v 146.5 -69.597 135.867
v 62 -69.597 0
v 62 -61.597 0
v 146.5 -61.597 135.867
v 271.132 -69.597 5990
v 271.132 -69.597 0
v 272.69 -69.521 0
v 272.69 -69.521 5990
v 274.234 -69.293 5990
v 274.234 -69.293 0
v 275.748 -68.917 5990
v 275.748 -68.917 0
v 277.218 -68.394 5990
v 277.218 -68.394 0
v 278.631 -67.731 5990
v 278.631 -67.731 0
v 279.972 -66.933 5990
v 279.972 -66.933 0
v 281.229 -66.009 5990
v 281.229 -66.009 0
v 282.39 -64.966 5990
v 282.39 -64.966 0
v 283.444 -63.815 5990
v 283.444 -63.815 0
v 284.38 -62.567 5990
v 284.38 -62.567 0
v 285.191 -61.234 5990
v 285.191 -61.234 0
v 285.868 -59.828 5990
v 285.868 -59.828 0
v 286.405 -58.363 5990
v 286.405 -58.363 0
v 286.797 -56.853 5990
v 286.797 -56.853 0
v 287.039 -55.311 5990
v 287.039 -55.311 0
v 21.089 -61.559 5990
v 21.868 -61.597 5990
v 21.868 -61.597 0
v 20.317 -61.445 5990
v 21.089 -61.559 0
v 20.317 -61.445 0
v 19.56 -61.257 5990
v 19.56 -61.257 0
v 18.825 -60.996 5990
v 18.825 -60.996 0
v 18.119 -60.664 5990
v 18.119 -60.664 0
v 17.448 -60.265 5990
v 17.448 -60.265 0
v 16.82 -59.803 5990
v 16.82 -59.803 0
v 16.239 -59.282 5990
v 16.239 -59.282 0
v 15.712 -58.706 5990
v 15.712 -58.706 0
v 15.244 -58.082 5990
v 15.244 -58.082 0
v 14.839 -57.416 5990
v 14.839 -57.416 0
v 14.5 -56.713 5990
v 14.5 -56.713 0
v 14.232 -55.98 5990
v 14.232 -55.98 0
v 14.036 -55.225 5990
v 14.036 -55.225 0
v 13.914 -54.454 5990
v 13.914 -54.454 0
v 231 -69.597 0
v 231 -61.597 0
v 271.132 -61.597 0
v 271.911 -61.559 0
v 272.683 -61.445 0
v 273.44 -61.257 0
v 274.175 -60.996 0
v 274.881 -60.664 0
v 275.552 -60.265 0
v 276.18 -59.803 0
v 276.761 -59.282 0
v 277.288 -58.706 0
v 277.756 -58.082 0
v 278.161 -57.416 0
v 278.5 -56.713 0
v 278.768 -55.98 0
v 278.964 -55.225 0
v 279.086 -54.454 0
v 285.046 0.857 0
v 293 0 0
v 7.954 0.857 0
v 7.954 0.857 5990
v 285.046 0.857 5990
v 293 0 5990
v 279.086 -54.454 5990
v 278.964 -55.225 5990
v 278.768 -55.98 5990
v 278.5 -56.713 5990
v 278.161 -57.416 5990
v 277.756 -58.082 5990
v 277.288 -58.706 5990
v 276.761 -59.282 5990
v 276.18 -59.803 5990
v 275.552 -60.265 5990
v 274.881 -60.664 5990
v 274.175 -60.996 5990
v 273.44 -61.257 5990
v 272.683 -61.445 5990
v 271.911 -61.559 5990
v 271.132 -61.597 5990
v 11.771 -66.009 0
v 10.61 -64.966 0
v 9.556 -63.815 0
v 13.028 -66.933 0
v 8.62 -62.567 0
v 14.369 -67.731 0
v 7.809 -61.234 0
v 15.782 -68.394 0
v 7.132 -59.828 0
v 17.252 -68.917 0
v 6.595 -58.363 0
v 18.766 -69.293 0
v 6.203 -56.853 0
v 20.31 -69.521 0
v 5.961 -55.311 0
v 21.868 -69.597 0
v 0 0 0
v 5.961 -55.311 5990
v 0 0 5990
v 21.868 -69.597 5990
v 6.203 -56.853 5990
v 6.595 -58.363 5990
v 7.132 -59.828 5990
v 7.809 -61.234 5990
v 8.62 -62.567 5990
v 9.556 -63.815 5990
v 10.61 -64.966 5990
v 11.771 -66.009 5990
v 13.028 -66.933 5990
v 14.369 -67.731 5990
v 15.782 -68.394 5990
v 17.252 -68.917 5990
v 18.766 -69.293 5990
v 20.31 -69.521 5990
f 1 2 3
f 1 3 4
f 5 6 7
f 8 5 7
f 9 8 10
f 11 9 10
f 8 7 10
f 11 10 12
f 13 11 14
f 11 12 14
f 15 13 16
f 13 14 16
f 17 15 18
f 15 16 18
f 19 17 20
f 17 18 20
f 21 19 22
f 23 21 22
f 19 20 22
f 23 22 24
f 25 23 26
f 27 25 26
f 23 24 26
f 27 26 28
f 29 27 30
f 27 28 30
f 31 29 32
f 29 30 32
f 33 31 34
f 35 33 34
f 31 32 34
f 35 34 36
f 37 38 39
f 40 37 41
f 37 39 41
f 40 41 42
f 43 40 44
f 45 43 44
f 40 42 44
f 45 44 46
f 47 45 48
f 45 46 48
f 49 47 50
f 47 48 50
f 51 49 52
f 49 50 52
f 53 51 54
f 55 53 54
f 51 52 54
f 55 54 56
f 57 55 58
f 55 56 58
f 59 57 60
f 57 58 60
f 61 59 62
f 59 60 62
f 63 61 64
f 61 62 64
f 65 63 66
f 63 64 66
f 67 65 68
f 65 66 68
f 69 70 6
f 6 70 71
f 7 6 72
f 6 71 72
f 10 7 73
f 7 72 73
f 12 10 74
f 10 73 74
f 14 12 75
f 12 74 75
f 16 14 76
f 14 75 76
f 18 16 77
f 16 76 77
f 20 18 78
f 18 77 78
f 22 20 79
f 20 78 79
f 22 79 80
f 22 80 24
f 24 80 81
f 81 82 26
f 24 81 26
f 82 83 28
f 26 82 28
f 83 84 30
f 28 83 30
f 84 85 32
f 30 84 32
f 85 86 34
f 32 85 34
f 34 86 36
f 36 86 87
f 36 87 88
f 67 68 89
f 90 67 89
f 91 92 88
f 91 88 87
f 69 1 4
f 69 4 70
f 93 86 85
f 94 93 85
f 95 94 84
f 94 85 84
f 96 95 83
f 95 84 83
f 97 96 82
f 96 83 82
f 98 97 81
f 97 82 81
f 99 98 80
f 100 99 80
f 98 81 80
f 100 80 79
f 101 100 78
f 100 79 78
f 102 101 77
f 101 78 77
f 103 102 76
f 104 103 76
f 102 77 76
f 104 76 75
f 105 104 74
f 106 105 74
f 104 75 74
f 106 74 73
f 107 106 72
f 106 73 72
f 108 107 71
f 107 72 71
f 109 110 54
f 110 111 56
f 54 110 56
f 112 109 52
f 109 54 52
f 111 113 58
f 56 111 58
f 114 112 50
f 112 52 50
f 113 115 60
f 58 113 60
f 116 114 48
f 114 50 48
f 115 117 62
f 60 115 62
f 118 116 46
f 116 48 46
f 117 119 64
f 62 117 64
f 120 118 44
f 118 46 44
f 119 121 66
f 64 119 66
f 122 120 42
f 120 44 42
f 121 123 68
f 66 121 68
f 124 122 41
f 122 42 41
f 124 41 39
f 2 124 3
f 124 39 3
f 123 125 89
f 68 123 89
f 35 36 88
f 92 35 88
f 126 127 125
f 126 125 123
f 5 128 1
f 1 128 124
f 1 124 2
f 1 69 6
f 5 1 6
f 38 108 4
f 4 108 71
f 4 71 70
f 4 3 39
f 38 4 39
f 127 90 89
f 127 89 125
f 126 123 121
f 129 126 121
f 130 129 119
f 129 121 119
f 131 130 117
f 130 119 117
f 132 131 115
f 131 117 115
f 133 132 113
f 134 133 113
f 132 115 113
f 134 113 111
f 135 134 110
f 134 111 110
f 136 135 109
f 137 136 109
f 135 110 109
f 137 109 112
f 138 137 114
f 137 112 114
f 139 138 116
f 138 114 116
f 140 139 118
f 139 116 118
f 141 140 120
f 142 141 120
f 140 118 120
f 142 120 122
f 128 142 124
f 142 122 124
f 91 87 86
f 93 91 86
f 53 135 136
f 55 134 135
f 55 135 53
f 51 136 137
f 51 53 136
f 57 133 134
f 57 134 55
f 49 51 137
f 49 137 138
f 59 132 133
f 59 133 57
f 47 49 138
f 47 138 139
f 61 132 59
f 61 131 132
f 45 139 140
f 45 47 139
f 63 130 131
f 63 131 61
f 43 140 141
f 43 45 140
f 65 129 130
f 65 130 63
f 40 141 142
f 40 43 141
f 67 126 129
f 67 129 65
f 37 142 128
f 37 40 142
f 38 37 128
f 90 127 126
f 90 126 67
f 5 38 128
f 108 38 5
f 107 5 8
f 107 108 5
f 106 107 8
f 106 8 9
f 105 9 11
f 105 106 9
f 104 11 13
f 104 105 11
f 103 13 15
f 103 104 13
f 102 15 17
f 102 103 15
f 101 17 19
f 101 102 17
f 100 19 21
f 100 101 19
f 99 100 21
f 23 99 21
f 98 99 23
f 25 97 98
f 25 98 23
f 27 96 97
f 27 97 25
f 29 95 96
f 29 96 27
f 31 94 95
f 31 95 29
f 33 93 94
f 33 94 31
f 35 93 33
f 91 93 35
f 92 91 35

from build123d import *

# Parameters (mm, degrees)
TABAN_FLAN_1_DEPTH         = 5990
KES_EKSTR_ZYON1_DEPTH      = 5998.486934273
KES_EKSTR_ZYON1_DEPTH_BACK = 5998.486934273


# Sheet-metal steps are written as plain solids
with BuildPart() as part:
    # Çizim1 → Taban-Flanş1 (new body)
    with BuildSketch(Plane.XY):
        with BuildLine():
            Line((0, 0), (5.960525983, -55.31134025))
            ThreePointArc((5.960525983, -55.31134025), (11.177974486, -65.501435482), (21.868424162, -69.597054535))
            Line((21.868424162, -69.597054535), (271.131575838, -69.597054535))
            ThreePointArc((271.131575838, -69.597054535), (281.822025514, -65.501435482), (287.039474017, -55.31134025))
            Line((287.039474017, -55.31134025), (293, 0))
            Line((293, 0), (285.04605091, 0.857142857))
            Line((285.04605091, 0.857142857), (279.085524928, -54.454197393))
            ThreePointArc((279.085524928, -54.454197393), (276.476800676, -59.549245009), (271.131575838, -61.597054535))
            Line((271.131575838, -61.597054535), (21.868424162, -61.597054535))
            ThreePointArc((21.868424162, -61.597054535), (16.523199324, -59.549245009), (13.914475072, -54.454197393))
            Line((13.914475072, -54.454197393), (7.95394909, 0.857142857))
            Line((7.95394909, 0.857142857), (0, 0))
        make_face()
    extrude(amount=TABAN_FLAN_1_DEPTH)

    # Çizim6 → Kes-Ekstrüzyon1 (cut, two sides: drawn at the far end of the back side and taken through both)
    with BuildSketch(Plane(origin=(0, -61.597054535, 0), x_dir=(1, 0, 0), z_dir=(0, 1, 0)).offset(-KES_EKSTR_ZYON1_DEPTH_BACK)):
        Polygon((62, 0), (146.5, -135.866662578), (231, 0), (231, 53.477890067), (62, 53.477890067), align=None)
    extrude(amount=KES_EKSTR_ZYON1_DEPTH + KES_EKSTR_ZYON1_DEPTH_BACK, mode=Mode.SUBTRACT)


solid = part.part
